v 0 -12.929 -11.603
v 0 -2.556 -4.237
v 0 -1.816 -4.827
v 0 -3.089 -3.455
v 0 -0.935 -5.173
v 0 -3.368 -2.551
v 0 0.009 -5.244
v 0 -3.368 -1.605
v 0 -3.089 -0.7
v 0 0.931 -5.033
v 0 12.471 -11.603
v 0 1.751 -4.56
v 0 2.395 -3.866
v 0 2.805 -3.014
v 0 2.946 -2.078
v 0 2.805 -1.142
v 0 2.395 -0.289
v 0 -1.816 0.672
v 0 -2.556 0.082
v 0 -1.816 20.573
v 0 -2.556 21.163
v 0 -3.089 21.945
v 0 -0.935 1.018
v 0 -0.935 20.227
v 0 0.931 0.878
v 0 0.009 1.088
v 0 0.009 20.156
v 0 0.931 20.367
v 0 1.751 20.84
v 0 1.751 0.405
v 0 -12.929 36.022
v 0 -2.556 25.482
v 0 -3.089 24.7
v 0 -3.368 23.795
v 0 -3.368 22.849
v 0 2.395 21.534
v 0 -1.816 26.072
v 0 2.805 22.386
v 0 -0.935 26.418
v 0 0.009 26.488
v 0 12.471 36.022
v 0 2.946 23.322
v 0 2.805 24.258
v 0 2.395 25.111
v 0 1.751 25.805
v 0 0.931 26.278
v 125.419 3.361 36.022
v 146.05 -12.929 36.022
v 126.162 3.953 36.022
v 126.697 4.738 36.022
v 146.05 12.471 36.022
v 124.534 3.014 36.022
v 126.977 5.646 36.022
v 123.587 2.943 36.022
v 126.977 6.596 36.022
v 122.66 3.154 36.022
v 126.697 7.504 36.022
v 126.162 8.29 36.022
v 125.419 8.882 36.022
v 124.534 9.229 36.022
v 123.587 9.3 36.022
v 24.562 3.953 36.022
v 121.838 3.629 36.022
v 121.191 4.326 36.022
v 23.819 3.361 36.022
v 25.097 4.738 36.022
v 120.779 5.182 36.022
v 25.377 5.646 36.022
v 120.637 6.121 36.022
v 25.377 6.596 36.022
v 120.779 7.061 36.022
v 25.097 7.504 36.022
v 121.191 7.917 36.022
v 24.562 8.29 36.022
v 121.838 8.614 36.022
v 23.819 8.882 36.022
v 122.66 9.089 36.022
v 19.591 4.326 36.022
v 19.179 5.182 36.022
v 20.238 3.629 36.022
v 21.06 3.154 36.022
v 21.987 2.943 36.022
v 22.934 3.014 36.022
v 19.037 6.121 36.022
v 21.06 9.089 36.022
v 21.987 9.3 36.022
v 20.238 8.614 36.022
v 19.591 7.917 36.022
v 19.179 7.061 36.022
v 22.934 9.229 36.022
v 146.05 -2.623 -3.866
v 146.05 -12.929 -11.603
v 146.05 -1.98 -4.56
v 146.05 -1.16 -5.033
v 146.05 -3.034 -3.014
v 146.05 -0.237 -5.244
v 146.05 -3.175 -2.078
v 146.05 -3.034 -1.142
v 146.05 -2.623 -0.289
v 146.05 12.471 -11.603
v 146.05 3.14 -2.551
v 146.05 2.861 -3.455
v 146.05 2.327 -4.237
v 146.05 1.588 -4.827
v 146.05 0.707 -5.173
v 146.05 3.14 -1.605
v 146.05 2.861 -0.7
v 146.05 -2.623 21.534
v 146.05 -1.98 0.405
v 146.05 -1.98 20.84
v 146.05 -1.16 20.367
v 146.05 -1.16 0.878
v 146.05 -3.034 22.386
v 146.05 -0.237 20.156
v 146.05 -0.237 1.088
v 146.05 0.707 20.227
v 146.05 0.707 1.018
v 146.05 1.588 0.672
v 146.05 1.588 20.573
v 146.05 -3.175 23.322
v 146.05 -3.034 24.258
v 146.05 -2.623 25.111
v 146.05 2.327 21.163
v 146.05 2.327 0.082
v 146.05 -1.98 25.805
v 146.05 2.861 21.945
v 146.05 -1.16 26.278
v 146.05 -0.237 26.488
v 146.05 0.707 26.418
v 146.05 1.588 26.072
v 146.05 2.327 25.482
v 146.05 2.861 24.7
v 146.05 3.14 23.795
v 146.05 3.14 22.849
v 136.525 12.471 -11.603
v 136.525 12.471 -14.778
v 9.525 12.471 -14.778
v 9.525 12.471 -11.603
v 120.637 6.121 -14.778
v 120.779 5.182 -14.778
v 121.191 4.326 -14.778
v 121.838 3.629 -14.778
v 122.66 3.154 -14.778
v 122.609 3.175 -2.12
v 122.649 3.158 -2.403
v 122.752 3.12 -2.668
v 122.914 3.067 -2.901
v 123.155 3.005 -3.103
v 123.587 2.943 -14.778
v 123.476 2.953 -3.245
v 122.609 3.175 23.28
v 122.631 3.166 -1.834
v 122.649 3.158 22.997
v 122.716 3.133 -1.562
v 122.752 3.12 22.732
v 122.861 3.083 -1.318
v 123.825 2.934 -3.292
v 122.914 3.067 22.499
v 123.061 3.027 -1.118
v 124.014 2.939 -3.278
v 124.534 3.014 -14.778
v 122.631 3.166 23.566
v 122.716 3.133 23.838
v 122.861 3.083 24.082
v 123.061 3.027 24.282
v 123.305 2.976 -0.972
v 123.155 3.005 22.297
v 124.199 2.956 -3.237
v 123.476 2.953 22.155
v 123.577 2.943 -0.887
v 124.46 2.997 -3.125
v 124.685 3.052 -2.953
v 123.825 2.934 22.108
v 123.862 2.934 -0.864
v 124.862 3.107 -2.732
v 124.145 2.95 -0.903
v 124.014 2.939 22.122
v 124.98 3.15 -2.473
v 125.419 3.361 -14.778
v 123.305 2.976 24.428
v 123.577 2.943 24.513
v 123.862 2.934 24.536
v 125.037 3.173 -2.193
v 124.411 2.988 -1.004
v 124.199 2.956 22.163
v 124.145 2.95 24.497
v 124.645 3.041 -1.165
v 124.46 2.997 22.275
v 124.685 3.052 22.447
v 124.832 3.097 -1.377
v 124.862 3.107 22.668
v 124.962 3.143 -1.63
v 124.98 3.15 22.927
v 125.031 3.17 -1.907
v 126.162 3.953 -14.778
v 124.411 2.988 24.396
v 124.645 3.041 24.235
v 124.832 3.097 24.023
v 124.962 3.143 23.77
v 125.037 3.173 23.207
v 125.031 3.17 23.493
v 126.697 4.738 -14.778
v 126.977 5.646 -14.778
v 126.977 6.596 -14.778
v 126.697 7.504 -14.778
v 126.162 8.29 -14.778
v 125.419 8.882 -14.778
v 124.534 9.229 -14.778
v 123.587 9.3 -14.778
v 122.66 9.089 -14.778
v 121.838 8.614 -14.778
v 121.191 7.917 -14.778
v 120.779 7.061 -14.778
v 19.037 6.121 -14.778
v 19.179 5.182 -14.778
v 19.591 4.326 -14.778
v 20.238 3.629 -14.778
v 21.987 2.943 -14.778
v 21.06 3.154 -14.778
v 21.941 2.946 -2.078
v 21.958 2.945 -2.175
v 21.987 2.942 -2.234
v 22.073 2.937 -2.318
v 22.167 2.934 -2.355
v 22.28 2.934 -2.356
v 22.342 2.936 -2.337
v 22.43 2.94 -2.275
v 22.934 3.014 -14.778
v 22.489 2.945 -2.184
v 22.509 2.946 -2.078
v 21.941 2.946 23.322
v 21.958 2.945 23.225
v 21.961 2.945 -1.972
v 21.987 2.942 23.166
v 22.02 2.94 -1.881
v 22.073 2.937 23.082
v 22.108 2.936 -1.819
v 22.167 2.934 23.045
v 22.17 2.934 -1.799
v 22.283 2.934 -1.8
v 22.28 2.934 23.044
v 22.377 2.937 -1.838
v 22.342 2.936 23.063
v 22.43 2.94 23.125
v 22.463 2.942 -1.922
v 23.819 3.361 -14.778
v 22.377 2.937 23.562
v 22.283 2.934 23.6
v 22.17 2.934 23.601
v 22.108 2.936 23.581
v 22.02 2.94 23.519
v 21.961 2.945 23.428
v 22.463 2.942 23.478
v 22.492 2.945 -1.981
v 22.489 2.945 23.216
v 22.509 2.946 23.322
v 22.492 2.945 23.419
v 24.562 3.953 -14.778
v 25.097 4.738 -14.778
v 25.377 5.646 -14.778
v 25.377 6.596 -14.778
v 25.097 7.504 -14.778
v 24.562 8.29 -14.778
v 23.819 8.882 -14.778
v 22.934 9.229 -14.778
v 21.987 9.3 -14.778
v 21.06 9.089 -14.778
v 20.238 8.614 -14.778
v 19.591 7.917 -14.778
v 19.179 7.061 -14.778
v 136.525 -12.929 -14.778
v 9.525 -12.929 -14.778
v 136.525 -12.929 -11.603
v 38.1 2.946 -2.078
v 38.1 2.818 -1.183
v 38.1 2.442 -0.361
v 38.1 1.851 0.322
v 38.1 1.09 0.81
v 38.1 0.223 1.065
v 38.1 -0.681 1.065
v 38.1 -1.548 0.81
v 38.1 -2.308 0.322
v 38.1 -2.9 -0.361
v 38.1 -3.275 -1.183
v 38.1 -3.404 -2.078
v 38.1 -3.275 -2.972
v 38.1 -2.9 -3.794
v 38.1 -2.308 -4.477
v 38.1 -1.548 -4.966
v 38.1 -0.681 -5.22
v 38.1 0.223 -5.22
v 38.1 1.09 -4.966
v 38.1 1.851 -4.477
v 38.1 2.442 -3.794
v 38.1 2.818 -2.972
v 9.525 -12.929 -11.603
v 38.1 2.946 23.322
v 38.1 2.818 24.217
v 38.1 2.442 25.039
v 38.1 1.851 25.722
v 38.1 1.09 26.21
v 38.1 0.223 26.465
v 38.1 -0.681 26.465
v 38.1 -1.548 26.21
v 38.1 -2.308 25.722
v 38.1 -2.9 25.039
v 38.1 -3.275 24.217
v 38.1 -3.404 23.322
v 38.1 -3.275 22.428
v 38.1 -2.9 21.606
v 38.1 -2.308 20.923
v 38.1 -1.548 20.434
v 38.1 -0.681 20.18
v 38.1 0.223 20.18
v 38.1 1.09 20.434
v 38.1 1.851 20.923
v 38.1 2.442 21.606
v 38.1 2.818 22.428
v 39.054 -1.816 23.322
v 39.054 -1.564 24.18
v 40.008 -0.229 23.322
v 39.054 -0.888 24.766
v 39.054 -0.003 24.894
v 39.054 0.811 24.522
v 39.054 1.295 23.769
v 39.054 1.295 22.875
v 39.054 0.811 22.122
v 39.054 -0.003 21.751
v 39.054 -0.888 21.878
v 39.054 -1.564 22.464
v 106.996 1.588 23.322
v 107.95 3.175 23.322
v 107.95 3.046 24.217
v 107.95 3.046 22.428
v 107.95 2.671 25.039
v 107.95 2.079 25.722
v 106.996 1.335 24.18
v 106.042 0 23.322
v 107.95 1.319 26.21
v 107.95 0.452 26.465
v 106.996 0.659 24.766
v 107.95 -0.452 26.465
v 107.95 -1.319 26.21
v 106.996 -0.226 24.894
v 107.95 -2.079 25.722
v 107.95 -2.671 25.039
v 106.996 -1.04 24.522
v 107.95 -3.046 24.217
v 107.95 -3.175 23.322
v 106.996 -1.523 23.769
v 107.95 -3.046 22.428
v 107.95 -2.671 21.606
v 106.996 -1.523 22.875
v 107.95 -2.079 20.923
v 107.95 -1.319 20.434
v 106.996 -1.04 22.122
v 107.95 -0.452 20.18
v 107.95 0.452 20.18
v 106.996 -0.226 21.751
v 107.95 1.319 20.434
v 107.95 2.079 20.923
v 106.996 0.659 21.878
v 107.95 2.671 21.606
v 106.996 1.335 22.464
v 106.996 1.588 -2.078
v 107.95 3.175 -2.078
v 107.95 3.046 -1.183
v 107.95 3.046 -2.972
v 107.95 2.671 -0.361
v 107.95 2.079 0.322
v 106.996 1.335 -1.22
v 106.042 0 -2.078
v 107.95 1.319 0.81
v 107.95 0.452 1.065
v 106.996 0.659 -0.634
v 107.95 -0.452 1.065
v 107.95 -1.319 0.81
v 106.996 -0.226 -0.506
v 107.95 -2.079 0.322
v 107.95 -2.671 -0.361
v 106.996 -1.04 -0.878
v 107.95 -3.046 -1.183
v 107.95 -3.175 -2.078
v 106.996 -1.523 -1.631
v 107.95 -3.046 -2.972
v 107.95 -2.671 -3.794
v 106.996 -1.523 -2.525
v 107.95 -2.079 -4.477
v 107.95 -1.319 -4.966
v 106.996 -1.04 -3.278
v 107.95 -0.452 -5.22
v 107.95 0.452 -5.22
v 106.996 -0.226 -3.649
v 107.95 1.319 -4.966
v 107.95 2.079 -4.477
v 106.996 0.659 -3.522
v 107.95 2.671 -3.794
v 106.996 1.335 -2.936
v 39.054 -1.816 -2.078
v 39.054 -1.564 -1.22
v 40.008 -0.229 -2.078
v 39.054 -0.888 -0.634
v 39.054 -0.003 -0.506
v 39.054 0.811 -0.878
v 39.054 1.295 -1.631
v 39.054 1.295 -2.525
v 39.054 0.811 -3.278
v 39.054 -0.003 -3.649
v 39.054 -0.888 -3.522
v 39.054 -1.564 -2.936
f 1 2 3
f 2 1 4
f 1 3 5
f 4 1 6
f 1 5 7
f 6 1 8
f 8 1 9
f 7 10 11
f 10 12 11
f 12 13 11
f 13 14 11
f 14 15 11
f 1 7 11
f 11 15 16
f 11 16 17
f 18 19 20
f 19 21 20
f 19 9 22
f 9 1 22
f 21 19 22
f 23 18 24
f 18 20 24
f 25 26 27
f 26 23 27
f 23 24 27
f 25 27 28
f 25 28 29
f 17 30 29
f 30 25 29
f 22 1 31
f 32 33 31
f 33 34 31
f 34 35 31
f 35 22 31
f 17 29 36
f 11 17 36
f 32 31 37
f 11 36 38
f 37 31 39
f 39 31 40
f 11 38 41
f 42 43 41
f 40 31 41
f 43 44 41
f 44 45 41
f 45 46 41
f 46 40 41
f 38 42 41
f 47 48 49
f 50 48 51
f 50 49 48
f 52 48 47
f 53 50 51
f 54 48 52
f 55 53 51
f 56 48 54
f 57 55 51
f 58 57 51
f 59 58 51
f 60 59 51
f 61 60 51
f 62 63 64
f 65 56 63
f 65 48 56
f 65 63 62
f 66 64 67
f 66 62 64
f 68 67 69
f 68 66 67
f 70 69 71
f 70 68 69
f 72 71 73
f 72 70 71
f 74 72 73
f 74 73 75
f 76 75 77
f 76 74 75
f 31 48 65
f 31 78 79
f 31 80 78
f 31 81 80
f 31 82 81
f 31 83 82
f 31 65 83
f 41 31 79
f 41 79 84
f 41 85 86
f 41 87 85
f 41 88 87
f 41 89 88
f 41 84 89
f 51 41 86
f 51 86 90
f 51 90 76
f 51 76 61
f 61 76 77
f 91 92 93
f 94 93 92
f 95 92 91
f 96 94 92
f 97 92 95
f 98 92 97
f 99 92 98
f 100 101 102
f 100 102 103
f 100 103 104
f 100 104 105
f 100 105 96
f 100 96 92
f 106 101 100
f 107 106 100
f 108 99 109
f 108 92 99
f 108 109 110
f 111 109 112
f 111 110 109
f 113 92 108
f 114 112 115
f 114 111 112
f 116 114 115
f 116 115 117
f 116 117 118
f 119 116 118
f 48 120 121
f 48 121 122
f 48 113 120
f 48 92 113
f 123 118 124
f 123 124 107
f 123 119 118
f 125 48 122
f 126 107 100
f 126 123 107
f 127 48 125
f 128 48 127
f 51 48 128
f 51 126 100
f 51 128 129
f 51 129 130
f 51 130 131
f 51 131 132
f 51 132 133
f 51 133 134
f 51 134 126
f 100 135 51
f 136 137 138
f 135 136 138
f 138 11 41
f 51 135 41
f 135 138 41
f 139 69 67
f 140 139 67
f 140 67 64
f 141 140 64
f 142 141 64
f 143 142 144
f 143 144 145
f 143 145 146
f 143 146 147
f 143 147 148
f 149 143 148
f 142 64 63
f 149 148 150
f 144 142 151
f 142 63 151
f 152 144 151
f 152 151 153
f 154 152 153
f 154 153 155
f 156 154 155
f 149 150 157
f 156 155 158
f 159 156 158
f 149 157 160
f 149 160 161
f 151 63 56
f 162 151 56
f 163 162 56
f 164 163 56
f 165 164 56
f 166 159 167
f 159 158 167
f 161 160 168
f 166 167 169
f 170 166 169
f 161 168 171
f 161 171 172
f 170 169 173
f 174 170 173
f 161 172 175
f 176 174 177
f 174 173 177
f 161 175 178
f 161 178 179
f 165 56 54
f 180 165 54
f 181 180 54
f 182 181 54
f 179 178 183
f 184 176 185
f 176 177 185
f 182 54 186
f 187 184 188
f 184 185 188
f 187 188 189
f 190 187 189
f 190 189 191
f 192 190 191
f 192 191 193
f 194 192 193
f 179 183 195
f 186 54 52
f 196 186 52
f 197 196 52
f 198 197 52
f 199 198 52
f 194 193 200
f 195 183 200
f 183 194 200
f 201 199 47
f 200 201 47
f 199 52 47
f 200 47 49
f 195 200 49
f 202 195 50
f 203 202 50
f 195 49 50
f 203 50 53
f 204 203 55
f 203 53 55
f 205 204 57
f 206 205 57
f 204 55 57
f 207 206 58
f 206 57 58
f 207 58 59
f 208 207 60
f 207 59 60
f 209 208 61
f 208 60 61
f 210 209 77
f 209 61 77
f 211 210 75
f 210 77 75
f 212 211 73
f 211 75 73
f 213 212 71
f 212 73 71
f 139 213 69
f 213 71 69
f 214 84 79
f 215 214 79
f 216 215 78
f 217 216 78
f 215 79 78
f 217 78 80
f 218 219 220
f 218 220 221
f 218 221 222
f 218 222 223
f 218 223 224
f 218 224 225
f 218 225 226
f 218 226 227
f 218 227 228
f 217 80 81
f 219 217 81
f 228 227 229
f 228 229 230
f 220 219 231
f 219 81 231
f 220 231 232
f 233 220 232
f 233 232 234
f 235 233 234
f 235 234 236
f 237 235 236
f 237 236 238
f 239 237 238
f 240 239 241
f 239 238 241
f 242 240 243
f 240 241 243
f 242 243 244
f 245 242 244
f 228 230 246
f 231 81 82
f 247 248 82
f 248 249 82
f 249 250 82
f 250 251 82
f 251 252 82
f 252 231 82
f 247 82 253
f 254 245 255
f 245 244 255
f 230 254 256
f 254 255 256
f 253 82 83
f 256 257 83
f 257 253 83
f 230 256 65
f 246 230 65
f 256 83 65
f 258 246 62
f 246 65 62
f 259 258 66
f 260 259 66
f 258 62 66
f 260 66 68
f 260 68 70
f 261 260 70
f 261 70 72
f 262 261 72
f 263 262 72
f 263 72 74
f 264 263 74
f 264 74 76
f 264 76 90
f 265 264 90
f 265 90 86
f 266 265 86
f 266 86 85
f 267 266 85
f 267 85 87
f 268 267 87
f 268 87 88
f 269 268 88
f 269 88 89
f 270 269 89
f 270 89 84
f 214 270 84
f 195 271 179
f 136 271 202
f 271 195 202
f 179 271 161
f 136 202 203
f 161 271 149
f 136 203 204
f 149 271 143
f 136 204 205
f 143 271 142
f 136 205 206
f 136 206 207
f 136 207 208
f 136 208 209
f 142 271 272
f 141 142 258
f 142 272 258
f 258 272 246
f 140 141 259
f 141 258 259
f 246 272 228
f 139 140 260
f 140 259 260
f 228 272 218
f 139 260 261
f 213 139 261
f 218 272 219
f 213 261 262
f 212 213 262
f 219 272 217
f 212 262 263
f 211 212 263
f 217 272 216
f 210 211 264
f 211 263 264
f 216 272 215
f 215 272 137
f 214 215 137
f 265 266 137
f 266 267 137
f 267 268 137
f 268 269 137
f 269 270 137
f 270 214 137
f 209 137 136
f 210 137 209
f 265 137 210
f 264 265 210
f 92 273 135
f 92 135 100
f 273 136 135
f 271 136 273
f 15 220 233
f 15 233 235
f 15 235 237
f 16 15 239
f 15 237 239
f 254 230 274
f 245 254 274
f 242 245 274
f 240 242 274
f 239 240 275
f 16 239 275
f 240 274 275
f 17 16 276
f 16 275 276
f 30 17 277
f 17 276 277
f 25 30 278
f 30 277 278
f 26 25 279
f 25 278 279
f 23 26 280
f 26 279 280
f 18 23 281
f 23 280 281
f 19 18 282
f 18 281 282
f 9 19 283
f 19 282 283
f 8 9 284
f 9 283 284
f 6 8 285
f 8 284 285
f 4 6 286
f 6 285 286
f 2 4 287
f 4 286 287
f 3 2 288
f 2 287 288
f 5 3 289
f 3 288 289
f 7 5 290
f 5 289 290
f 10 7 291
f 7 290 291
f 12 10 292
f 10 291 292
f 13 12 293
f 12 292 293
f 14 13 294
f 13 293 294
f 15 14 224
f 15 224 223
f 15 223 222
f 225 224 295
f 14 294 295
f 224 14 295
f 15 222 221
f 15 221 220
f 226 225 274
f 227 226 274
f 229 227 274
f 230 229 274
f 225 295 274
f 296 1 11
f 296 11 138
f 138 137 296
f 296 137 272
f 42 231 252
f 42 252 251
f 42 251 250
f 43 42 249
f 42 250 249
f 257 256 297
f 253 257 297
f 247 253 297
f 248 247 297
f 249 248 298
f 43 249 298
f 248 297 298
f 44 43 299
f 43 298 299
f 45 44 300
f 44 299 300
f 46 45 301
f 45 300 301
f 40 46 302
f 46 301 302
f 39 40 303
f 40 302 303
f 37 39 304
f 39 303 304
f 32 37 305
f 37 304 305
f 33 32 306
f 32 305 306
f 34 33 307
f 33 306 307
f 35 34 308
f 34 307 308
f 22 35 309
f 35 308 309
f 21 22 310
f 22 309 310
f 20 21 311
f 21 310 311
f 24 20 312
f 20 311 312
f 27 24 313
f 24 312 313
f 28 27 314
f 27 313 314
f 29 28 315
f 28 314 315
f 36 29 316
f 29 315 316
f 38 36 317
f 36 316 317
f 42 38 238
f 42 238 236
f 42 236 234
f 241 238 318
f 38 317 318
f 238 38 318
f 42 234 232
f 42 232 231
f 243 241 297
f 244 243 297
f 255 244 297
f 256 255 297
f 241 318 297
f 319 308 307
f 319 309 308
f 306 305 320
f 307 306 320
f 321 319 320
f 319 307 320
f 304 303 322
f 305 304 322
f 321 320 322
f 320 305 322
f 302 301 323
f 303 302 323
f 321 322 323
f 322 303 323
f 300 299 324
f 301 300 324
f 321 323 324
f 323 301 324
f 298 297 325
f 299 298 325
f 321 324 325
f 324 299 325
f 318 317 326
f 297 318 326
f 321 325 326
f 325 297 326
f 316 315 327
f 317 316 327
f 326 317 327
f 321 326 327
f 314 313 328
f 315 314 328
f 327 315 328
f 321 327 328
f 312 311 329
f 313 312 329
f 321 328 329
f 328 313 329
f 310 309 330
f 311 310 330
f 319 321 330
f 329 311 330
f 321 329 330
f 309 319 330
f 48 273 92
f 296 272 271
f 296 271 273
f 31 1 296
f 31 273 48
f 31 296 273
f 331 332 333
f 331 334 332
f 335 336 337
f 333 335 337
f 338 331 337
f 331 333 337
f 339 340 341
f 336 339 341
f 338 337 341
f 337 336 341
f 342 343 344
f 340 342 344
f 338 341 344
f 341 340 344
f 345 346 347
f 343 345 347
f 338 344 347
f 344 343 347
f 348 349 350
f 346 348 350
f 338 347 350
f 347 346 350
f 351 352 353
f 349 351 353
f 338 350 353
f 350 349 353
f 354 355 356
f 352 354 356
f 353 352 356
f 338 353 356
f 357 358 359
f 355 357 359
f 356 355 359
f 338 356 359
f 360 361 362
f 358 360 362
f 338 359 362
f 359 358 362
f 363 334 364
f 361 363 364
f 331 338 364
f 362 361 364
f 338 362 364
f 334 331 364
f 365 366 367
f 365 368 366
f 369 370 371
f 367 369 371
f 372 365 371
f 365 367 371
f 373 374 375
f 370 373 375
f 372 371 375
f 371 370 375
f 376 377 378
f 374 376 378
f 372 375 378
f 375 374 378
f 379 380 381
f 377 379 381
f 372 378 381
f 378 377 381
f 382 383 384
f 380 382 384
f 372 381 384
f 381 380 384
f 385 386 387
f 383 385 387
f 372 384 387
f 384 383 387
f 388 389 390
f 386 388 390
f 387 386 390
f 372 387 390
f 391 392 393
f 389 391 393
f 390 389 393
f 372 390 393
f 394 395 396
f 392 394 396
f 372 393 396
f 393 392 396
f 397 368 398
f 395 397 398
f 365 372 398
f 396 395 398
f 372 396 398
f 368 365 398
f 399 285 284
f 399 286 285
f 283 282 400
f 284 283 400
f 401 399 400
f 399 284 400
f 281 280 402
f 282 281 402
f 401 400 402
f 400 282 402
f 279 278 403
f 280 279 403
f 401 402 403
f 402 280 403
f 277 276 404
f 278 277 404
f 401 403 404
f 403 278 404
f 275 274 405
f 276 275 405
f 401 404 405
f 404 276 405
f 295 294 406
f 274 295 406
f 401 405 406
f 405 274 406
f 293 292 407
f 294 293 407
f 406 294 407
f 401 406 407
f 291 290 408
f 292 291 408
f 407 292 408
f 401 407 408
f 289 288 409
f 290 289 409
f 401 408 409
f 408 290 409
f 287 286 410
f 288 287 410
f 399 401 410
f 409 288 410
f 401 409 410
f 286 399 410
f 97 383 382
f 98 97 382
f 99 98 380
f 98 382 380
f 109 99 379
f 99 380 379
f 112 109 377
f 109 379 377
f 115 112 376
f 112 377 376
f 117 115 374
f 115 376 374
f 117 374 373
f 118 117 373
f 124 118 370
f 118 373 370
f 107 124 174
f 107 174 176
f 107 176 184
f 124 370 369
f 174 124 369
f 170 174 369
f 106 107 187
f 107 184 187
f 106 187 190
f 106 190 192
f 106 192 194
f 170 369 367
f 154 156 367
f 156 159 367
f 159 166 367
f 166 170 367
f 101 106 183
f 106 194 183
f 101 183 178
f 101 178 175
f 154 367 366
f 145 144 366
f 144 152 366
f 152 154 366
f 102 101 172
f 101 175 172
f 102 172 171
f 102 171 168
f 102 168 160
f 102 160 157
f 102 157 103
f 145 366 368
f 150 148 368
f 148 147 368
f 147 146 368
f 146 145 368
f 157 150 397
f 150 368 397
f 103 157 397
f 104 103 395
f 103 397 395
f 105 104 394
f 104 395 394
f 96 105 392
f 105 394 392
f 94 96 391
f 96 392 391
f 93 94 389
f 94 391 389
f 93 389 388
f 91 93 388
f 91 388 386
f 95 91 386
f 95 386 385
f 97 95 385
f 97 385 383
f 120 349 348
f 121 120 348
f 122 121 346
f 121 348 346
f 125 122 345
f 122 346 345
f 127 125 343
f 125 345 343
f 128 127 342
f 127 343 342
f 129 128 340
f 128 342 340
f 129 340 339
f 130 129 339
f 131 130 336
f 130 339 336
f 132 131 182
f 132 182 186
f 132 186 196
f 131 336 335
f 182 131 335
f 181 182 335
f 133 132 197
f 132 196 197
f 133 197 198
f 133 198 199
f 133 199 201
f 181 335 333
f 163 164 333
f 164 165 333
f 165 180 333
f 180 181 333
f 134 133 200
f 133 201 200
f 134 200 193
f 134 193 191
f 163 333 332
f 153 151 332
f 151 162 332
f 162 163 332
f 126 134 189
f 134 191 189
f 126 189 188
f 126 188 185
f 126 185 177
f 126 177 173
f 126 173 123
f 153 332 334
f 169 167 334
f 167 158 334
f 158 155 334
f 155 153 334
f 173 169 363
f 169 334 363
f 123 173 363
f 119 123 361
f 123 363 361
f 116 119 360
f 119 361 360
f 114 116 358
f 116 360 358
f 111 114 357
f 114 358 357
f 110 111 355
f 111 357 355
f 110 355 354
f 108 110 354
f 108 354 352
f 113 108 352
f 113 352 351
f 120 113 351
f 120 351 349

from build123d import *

# Parameters (mm, degrees)
F0_W     = 25.4
F0_H     = 50.8
F1_DEPTH = 146.05
F2_W     = 9.525
F2_H     = 25.4
F3_DEPTH = 3.175
F5_D     = 6.35
F5_DEPTH = 38.1
F5_TIP   = 1.9077324654
F7_D     = 6.35
F7_DEPTH = 38.1
F7_TIP   = 1.9077324654
F9_D     = 6.3754


with BuildPart() as f1:
    # F0 (on Right) → F1 (new body)
    with BuildSketch(Plane.YZ):
        with Locations((-0.2286629751, 10.6222124508)):
            Rectangle(F0_W, F0_H)
    extrude(amount=F1_DEPTH)

    # F2 (on face) → F3 (cut)
    with BuildSketch(Plane(origin=(0, 0, -14.7777875492), x_dir=(1, 0, 0), z_dir=(0, 0, -1))):
        with Locations((141.2875, 0.2286629751)):
            Rectangle(F2_W, F2_H)
        with Locations((4.7625, 0.2286629751)):
            Rectangle(F2_W, F2_H)
    extrude(amount=-F3_DEPTH, mode=Mode.SUBTRACT)

    # F5
    with Locations(Plane.YZ.offset(146.05)):
        with Locations((0, 23.3222124508), (0, -2.0777875492)):
            Hole(F5_D / 2, depth=F5_DEPTH)
            with Locations((0, 0, -(F5_DEPTH + F5_TIP / 2))):  # 118° drill point
                Cone(0, F5_D / 2, F5_TIP, mode=Mode.SUBTRACT)

    # F7
    with Locations(Plane(origin=(0, 0, 0), x_dir=(0, -1, 0), z_dir=(-1, 0, 0))):
        with Locations((0.2286629751, 23.3222124508), (0.2286629751, -2.0777875492)):
            Hole(F7_D / 2, depth=F7_DEPTH)
            with Locations((0, 0, -(F7_DEPTH + F7_TIP / 2))):  # 118° drill point
                Cone(0, F7_D / 2, F7_TIP, mode=Mode.SUBTRACT)

    # F9 (through all)
    with Locations(Plane(origin=(0, 0, -14.7777875492), x_dir=(1, 0, 0), z_dir=(0, 0, -1))):
        with Locations((123.825, -6.1213370249), (22.225, -6.1213370249)):
            Hole(F9_D / 2)


solid = f1.part
